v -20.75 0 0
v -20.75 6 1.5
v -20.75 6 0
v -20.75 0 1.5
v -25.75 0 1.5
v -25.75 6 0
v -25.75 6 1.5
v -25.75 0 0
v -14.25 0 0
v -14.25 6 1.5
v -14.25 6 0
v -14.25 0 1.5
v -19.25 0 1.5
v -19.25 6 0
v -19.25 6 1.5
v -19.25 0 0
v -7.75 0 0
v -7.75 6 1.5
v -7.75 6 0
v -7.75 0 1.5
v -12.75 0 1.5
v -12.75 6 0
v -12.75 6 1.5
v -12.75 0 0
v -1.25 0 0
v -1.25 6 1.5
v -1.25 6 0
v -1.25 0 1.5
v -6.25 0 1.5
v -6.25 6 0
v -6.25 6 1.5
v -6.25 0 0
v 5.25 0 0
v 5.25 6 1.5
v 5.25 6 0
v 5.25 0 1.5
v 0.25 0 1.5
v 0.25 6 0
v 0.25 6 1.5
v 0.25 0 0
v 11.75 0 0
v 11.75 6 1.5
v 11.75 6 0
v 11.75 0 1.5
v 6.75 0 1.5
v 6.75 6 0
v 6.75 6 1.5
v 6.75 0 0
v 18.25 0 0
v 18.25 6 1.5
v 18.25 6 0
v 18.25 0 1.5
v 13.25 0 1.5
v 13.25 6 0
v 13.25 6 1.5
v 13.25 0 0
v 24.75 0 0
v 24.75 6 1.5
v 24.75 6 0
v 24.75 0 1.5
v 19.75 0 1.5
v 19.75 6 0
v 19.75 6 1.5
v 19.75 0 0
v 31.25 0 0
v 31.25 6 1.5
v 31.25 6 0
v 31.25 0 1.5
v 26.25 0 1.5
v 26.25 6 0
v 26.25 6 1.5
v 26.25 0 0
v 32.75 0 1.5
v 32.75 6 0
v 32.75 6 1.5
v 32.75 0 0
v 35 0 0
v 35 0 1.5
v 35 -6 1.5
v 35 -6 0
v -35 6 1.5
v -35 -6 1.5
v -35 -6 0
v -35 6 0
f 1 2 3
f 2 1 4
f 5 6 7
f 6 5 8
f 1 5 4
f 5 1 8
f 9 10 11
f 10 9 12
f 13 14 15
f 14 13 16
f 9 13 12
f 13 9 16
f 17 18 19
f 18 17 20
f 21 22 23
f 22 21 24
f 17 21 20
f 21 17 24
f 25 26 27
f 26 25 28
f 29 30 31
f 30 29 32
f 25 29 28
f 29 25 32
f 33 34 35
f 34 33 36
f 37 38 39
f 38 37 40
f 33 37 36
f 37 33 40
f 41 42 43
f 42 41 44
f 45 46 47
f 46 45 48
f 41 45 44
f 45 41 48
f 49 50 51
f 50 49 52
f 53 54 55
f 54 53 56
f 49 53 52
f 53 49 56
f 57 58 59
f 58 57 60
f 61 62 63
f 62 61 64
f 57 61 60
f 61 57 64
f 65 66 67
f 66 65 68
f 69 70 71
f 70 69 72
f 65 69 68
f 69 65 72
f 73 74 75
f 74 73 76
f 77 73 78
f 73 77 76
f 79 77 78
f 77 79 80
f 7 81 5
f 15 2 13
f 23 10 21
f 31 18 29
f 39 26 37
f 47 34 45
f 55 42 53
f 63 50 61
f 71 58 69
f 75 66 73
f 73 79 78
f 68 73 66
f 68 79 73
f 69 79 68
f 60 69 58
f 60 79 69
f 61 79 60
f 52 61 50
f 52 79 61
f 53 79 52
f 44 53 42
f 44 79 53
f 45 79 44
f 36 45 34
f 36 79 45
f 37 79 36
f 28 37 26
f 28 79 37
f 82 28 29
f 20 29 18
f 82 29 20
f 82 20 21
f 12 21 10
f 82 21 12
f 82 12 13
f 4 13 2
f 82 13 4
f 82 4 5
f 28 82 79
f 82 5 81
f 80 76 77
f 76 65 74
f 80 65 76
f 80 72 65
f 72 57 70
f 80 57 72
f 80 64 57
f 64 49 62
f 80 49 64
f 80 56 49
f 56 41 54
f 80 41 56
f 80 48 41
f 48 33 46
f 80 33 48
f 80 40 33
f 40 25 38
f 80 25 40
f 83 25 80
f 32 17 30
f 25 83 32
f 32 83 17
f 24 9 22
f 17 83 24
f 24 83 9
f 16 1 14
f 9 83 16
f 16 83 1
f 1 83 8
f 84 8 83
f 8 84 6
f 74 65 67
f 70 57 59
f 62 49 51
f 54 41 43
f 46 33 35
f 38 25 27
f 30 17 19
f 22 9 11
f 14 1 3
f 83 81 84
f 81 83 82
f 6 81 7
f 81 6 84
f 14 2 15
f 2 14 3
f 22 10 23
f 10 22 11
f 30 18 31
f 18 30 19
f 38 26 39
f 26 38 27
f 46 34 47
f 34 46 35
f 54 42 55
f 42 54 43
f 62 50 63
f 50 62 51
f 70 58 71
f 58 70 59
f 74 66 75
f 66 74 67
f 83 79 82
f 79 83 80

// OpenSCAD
// 10-well comb for agarose gel casting
// Print orientation: flat on bed, teeth pointing down (-Z)

// ---------- Parameters ----------
plate_len    = 70;    // spine length (X)
plate_wid    = 12;    // spine width (Y)
plate_thk    = 1.5;   // plate thickness (Z)

tooth_count  = 10;    // number of wells
tooth_w      = 5.0;   // tooth width (X)
tooth_len    = 12;    // tooth length from spine (Y)
tooth_pitch  = 1.5;   // gap between neighbouring teeth (X)

eps          = 0.5;   // cutter overshoot past faces

$fn = 64;

// ---------- Derived ----------
row_len = (tooth_count - 1) * tooth_pitch;  // span of gaps
x0 = -(plate_len / 2 - tooth_w / 2 - row_len / 2);  // first tooth centre

// ---------- Model ----------
difference() {
    // Base plate
    translate([-plate_len / 2, -plate_wid / 2, 0])
        cube([plate_len, plate_wid, plate_thk]);

    // Teeth (through-cut, extend below z = 0)
    for (i = [0 : tooth_count - 1])
        translate([x0 + i * (tooth_w + tooth_pitch), 0, -eps])
            cube([tooth_w, tooth_len + eps, plate_thk + 2 * eps]);
}
